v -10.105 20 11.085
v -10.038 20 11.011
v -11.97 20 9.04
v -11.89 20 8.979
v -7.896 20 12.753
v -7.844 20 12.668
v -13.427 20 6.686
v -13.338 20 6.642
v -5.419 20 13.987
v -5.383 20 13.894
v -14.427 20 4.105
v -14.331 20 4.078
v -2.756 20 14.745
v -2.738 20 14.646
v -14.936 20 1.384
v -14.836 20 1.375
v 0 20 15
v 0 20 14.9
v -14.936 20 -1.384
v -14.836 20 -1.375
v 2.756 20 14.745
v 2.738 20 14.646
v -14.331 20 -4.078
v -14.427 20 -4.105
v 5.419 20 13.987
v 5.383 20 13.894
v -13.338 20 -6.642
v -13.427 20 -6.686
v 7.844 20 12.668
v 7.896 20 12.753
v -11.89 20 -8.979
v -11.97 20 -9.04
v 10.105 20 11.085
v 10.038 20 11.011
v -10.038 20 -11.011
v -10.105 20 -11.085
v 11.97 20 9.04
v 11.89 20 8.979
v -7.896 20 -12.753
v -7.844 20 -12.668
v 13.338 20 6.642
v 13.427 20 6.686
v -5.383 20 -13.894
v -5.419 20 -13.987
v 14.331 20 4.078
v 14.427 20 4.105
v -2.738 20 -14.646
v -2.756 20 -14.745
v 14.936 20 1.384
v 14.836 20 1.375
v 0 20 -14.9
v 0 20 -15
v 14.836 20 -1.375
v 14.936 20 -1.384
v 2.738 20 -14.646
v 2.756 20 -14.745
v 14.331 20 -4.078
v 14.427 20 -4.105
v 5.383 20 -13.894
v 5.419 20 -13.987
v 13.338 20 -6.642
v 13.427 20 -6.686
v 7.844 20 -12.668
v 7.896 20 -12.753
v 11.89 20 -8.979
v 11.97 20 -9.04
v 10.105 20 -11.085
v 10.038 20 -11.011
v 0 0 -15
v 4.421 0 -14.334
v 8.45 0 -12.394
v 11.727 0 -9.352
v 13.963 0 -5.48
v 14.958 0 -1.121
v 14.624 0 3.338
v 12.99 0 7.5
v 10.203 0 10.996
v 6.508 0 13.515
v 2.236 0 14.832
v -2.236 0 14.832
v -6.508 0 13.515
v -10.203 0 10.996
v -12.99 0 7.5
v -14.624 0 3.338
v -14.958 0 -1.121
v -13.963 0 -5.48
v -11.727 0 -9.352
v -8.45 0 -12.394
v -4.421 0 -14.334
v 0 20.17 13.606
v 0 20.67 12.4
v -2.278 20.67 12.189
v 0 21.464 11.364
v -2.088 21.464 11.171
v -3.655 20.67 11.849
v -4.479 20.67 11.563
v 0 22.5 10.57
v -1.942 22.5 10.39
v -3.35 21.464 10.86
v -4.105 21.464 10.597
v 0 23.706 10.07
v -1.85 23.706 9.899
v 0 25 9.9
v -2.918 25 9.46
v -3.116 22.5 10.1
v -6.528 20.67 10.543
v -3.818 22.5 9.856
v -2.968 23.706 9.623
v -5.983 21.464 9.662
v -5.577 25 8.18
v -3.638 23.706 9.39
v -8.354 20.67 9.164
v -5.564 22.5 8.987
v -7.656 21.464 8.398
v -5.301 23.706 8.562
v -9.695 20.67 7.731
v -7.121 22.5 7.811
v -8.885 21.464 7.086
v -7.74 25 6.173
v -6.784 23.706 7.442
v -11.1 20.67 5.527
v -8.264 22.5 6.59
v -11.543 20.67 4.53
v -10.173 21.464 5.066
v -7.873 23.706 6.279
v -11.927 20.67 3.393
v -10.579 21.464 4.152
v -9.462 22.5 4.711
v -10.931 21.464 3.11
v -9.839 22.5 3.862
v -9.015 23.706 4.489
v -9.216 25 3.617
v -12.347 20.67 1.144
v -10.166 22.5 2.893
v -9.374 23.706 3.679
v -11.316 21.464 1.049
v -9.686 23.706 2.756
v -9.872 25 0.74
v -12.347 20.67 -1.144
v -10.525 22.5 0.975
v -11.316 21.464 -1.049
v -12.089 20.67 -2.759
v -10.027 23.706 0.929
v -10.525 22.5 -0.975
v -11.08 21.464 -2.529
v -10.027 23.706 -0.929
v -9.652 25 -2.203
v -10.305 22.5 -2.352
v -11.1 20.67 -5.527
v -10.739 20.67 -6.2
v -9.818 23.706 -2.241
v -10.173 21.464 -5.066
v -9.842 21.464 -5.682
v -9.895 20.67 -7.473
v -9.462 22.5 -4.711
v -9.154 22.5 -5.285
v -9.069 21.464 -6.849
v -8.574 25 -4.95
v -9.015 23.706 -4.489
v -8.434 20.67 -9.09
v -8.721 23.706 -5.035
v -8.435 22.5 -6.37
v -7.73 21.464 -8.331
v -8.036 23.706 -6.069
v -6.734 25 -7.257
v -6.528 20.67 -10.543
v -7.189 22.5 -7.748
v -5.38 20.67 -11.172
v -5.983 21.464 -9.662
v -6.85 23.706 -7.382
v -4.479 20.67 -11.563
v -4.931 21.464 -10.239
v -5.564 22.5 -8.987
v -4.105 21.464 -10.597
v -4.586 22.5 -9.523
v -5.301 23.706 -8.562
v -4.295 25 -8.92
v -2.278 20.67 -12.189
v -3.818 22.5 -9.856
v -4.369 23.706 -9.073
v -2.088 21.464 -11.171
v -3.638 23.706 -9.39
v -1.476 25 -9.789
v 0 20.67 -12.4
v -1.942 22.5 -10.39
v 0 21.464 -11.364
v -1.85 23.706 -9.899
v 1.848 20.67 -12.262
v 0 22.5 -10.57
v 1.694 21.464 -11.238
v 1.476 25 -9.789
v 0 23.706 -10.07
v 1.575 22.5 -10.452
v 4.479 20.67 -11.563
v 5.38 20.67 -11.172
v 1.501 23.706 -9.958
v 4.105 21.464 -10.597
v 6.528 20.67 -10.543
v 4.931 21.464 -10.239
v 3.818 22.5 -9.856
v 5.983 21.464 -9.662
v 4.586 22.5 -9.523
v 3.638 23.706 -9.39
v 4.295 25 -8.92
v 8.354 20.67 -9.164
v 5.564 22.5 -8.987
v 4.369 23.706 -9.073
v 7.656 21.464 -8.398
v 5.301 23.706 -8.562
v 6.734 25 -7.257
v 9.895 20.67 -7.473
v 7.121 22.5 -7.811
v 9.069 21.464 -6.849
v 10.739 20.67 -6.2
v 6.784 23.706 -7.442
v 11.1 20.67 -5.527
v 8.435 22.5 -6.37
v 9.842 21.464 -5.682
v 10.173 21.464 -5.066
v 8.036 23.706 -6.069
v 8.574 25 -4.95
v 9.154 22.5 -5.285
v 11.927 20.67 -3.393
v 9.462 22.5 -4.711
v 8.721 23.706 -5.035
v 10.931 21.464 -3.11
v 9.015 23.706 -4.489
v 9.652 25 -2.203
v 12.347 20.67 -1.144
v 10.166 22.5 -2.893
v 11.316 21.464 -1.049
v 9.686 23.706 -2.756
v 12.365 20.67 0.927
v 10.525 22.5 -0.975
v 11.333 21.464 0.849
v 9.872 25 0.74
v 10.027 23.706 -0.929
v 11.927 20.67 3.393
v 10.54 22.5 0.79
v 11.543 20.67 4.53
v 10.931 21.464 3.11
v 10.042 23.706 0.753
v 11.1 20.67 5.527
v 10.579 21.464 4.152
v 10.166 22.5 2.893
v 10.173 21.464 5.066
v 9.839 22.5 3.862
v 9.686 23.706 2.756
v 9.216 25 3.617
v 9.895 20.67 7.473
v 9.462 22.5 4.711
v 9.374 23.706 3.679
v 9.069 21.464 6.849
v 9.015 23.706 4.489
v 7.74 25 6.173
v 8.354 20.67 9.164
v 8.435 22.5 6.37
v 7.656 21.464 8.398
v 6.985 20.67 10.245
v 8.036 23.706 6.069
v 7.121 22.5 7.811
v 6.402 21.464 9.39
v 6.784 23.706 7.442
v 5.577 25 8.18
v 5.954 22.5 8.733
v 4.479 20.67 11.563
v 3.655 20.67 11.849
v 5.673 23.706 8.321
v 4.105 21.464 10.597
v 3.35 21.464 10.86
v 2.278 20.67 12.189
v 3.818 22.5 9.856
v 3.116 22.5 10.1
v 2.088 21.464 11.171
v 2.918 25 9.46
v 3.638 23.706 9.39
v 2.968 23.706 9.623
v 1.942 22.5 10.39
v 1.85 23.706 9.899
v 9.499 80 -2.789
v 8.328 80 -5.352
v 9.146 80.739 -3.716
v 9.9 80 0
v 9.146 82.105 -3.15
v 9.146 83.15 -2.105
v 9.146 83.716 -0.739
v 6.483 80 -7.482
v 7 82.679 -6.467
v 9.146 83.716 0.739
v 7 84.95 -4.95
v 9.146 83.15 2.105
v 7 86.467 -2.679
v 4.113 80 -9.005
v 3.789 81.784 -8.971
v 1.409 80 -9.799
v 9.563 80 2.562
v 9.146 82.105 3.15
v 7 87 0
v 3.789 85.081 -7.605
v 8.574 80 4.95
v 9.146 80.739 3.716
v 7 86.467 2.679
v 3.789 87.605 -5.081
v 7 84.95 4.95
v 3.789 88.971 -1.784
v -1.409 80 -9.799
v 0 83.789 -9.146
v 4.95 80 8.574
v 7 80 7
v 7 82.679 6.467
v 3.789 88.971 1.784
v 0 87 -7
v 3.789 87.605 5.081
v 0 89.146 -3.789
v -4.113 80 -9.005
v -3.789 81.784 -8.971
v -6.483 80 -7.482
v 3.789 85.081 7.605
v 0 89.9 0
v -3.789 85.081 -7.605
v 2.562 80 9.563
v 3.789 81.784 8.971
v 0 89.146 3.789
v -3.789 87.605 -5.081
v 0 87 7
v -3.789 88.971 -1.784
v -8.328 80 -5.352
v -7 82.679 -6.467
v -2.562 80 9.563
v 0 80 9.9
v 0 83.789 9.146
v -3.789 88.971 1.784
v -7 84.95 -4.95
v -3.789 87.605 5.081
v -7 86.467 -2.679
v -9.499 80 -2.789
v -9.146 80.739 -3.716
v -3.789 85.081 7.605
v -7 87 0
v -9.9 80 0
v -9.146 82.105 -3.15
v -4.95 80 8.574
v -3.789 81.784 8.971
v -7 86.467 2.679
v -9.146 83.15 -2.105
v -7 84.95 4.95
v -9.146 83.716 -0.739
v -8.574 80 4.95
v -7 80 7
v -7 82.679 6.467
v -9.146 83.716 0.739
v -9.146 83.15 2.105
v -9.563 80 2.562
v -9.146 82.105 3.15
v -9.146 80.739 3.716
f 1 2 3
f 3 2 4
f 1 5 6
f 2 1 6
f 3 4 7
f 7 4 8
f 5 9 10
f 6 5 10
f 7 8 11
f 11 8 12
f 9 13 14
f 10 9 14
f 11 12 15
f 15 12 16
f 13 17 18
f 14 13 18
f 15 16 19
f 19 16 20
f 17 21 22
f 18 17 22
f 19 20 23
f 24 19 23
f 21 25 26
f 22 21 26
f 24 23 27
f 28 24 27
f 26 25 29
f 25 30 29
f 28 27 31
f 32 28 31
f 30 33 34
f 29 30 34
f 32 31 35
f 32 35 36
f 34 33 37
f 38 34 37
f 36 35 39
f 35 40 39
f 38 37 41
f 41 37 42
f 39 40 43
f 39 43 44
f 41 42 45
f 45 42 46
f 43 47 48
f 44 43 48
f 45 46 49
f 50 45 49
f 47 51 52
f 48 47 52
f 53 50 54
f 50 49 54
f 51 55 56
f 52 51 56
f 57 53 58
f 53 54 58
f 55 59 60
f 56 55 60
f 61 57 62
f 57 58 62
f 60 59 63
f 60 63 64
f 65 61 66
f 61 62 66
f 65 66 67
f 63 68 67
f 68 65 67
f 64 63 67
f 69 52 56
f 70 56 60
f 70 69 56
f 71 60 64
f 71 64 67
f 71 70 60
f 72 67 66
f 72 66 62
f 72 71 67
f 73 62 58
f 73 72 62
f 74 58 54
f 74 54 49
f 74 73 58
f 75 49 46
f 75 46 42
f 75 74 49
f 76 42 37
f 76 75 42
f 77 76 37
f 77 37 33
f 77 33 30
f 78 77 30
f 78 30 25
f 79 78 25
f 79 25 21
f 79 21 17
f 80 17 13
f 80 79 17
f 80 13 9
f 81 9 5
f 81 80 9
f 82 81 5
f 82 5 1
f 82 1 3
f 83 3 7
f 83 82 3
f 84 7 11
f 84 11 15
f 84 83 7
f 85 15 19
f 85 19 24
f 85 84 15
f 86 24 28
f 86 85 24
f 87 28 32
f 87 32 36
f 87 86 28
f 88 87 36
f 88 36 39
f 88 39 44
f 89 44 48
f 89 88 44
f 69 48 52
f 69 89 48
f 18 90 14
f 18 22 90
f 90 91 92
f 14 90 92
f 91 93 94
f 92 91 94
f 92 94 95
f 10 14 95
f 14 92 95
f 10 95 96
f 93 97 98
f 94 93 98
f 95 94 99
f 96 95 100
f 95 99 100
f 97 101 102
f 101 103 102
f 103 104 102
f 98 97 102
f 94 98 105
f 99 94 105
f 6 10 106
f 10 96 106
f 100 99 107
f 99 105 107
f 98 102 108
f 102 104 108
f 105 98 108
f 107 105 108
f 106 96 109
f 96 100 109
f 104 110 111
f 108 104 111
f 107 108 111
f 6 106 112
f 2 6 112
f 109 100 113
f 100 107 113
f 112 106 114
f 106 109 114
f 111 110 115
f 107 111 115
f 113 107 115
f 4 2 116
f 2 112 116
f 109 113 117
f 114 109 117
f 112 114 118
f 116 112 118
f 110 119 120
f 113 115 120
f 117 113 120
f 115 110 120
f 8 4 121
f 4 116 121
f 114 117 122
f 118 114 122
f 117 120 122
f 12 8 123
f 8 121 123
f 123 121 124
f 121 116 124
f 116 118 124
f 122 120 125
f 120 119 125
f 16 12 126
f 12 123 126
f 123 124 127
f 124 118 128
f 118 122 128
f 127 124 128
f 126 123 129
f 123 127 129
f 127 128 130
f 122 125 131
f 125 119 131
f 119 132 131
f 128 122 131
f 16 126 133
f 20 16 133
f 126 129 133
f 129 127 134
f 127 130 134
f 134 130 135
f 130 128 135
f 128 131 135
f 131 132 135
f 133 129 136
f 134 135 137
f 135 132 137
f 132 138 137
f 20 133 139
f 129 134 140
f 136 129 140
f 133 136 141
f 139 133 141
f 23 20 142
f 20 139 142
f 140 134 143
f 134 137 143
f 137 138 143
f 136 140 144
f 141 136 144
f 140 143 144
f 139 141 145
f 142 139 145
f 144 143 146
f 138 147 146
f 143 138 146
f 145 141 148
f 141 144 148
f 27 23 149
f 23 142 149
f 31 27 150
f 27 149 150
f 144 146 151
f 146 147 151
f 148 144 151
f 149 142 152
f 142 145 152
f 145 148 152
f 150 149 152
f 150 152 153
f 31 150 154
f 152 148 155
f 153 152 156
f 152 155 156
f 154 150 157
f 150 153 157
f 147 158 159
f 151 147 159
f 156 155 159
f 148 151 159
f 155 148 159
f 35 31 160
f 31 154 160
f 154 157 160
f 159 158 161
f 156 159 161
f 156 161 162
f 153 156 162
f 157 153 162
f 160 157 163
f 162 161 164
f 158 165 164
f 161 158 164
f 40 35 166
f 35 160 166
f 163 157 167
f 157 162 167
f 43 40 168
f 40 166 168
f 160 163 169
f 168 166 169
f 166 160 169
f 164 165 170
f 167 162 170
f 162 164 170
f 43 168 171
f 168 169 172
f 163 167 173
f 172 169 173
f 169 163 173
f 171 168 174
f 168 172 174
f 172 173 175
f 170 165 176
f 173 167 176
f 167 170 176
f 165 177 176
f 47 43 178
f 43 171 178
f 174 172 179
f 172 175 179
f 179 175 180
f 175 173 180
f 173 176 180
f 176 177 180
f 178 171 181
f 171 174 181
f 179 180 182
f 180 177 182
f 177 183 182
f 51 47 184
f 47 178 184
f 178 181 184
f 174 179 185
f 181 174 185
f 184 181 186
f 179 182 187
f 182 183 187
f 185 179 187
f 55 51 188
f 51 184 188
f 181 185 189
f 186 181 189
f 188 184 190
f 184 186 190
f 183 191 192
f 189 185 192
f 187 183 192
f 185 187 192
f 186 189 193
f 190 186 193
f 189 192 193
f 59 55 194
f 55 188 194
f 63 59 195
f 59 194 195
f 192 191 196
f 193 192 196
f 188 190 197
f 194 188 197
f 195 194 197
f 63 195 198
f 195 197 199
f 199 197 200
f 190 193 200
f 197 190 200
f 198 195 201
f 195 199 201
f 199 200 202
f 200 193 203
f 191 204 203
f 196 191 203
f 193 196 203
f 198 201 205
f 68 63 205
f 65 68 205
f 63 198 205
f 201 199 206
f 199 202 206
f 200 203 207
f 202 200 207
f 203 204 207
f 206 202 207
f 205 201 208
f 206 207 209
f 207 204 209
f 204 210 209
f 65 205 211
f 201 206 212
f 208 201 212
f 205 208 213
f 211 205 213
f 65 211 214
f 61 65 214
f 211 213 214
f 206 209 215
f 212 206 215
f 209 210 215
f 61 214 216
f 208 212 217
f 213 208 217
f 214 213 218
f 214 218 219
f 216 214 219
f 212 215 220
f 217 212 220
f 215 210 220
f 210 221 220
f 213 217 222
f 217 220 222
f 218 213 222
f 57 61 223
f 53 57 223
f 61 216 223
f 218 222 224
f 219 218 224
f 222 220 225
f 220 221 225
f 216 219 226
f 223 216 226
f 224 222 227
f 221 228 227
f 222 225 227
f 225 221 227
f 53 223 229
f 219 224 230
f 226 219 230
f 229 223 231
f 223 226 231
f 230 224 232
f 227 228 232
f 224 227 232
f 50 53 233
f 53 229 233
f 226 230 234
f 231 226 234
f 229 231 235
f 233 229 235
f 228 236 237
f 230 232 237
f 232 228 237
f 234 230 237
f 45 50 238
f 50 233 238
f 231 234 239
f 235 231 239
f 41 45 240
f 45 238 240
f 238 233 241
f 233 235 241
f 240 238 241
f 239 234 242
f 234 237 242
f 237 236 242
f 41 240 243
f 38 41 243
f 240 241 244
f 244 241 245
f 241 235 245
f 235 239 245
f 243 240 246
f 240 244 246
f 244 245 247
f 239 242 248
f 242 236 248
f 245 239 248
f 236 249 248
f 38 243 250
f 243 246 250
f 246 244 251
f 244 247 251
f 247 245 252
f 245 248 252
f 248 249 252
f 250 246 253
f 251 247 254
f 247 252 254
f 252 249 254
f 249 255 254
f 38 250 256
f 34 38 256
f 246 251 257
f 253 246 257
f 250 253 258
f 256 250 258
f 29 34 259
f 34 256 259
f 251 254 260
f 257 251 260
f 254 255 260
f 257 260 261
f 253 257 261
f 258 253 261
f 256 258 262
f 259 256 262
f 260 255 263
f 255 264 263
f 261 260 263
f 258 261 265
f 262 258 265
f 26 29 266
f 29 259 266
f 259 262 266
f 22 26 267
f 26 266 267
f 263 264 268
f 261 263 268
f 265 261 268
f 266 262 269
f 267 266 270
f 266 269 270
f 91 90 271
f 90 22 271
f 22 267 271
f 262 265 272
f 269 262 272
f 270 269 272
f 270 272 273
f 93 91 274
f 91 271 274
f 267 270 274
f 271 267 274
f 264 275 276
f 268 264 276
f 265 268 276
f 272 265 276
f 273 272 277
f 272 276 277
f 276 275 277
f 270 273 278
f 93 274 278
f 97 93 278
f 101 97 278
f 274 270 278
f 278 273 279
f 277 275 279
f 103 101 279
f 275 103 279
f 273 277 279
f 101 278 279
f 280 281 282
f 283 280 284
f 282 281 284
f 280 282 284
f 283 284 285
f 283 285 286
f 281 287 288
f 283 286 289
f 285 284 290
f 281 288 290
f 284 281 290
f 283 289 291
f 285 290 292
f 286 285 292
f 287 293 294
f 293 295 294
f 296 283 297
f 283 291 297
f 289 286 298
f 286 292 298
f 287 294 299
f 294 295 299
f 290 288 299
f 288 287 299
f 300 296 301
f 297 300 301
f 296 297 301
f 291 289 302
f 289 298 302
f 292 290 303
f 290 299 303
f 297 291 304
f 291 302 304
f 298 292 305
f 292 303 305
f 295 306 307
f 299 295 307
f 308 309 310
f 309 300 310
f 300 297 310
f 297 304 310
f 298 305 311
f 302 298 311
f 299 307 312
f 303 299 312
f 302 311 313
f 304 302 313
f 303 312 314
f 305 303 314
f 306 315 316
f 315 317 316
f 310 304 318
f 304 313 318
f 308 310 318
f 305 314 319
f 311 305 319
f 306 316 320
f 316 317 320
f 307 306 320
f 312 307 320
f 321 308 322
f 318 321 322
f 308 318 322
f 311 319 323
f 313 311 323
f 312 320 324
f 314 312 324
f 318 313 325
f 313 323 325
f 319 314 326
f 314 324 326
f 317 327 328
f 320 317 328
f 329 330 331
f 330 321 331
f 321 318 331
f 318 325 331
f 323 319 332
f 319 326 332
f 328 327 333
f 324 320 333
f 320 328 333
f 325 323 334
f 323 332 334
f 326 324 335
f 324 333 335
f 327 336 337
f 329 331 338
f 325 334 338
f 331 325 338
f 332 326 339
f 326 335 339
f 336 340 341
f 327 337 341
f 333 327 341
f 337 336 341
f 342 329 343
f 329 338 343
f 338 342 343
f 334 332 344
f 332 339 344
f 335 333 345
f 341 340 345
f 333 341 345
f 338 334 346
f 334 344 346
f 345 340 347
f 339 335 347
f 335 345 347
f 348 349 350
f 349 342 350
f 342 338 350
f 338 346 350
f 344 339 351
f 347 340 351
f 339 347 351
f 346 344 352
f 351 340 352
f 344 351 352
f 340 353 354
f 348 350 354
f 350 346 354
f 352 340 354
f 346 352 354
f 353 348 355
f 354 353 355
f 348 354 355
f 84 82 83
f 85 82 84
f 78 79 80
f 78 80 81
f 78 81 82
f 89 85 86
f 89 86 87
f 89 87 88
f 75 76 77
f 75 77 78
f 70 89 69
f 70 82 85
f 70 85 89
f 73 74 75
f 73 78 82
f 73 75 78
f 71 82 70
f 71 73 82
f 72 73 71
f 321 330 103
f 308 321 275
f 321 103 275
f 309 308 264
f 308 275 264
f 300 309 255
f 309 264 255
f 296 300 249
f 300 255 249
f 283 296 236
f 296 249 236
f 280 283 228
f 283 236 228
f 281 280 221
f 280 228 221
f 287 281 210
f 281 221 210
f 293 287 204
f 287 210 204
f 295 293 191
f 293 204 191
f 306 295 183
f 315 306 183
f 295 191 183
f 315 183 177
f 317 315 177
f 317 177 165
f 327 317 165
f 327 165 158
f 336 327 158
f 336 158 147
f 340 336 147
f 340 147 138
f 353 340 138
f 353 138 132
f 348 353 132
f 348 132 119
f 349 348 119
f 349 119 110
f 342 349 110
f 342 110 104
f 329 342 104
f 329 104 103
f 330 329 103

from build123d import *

# Parameters (mm, degrees)
ESBO_O1_R                = 9.9
RESSALTO_EXTRUS_O1_DEPTH = 80
ESBO_O4_R                = 15
RESSALTO_EXTRUS_O2_DEPTH = 20
FILETE3_R                = 5


with BuildPart() as part:
    # Esboço1 → Ressalto-extrusão1 (new body)
    with BuildSketch(Plane(origin=(0, 0, 0), x_dir=(1, 0, 0), z_dir=(0, 1, 0))):
        with Locations(Location((0, 0, 0), (0, 0, 270))):
            Circle(ESBO_O1_R)
    extrude(amount=RESSALTO_EXTRUS_O1_DEPTH)

    # Esboço3 → Revolução1 (revolve)
    with BuildSketch(Plane.XY):
        with BuildLine():
            Line((-9.9, 80), (9.9, 80))
            ThreePointArc((9.9, 80), (0, 89.9), (-9.9, 80))
        make_face()
    revolve(axis=Axis((-9.9, 80, 0), (1, 0, 0)))

    # Esboço4 → Ressalto-extrusão2 (add)
    with BuildSketch(Plane.XZ):
        with Locations(Location((0, 0, 0), (0, 0, 270))):
            Circle(ESBO_O4_R)
    extrude(amount=-RESSALTO_EXTRUS_O2_DEPTH)

    # Filete3
    filete3_edges = [part.edges().sort_by_distance(p)[0] for p in [
        (0, 20, -9.9),
    ]]
    fillet(filete3_edges, radius=FILETE3_R)


solid = part.part
